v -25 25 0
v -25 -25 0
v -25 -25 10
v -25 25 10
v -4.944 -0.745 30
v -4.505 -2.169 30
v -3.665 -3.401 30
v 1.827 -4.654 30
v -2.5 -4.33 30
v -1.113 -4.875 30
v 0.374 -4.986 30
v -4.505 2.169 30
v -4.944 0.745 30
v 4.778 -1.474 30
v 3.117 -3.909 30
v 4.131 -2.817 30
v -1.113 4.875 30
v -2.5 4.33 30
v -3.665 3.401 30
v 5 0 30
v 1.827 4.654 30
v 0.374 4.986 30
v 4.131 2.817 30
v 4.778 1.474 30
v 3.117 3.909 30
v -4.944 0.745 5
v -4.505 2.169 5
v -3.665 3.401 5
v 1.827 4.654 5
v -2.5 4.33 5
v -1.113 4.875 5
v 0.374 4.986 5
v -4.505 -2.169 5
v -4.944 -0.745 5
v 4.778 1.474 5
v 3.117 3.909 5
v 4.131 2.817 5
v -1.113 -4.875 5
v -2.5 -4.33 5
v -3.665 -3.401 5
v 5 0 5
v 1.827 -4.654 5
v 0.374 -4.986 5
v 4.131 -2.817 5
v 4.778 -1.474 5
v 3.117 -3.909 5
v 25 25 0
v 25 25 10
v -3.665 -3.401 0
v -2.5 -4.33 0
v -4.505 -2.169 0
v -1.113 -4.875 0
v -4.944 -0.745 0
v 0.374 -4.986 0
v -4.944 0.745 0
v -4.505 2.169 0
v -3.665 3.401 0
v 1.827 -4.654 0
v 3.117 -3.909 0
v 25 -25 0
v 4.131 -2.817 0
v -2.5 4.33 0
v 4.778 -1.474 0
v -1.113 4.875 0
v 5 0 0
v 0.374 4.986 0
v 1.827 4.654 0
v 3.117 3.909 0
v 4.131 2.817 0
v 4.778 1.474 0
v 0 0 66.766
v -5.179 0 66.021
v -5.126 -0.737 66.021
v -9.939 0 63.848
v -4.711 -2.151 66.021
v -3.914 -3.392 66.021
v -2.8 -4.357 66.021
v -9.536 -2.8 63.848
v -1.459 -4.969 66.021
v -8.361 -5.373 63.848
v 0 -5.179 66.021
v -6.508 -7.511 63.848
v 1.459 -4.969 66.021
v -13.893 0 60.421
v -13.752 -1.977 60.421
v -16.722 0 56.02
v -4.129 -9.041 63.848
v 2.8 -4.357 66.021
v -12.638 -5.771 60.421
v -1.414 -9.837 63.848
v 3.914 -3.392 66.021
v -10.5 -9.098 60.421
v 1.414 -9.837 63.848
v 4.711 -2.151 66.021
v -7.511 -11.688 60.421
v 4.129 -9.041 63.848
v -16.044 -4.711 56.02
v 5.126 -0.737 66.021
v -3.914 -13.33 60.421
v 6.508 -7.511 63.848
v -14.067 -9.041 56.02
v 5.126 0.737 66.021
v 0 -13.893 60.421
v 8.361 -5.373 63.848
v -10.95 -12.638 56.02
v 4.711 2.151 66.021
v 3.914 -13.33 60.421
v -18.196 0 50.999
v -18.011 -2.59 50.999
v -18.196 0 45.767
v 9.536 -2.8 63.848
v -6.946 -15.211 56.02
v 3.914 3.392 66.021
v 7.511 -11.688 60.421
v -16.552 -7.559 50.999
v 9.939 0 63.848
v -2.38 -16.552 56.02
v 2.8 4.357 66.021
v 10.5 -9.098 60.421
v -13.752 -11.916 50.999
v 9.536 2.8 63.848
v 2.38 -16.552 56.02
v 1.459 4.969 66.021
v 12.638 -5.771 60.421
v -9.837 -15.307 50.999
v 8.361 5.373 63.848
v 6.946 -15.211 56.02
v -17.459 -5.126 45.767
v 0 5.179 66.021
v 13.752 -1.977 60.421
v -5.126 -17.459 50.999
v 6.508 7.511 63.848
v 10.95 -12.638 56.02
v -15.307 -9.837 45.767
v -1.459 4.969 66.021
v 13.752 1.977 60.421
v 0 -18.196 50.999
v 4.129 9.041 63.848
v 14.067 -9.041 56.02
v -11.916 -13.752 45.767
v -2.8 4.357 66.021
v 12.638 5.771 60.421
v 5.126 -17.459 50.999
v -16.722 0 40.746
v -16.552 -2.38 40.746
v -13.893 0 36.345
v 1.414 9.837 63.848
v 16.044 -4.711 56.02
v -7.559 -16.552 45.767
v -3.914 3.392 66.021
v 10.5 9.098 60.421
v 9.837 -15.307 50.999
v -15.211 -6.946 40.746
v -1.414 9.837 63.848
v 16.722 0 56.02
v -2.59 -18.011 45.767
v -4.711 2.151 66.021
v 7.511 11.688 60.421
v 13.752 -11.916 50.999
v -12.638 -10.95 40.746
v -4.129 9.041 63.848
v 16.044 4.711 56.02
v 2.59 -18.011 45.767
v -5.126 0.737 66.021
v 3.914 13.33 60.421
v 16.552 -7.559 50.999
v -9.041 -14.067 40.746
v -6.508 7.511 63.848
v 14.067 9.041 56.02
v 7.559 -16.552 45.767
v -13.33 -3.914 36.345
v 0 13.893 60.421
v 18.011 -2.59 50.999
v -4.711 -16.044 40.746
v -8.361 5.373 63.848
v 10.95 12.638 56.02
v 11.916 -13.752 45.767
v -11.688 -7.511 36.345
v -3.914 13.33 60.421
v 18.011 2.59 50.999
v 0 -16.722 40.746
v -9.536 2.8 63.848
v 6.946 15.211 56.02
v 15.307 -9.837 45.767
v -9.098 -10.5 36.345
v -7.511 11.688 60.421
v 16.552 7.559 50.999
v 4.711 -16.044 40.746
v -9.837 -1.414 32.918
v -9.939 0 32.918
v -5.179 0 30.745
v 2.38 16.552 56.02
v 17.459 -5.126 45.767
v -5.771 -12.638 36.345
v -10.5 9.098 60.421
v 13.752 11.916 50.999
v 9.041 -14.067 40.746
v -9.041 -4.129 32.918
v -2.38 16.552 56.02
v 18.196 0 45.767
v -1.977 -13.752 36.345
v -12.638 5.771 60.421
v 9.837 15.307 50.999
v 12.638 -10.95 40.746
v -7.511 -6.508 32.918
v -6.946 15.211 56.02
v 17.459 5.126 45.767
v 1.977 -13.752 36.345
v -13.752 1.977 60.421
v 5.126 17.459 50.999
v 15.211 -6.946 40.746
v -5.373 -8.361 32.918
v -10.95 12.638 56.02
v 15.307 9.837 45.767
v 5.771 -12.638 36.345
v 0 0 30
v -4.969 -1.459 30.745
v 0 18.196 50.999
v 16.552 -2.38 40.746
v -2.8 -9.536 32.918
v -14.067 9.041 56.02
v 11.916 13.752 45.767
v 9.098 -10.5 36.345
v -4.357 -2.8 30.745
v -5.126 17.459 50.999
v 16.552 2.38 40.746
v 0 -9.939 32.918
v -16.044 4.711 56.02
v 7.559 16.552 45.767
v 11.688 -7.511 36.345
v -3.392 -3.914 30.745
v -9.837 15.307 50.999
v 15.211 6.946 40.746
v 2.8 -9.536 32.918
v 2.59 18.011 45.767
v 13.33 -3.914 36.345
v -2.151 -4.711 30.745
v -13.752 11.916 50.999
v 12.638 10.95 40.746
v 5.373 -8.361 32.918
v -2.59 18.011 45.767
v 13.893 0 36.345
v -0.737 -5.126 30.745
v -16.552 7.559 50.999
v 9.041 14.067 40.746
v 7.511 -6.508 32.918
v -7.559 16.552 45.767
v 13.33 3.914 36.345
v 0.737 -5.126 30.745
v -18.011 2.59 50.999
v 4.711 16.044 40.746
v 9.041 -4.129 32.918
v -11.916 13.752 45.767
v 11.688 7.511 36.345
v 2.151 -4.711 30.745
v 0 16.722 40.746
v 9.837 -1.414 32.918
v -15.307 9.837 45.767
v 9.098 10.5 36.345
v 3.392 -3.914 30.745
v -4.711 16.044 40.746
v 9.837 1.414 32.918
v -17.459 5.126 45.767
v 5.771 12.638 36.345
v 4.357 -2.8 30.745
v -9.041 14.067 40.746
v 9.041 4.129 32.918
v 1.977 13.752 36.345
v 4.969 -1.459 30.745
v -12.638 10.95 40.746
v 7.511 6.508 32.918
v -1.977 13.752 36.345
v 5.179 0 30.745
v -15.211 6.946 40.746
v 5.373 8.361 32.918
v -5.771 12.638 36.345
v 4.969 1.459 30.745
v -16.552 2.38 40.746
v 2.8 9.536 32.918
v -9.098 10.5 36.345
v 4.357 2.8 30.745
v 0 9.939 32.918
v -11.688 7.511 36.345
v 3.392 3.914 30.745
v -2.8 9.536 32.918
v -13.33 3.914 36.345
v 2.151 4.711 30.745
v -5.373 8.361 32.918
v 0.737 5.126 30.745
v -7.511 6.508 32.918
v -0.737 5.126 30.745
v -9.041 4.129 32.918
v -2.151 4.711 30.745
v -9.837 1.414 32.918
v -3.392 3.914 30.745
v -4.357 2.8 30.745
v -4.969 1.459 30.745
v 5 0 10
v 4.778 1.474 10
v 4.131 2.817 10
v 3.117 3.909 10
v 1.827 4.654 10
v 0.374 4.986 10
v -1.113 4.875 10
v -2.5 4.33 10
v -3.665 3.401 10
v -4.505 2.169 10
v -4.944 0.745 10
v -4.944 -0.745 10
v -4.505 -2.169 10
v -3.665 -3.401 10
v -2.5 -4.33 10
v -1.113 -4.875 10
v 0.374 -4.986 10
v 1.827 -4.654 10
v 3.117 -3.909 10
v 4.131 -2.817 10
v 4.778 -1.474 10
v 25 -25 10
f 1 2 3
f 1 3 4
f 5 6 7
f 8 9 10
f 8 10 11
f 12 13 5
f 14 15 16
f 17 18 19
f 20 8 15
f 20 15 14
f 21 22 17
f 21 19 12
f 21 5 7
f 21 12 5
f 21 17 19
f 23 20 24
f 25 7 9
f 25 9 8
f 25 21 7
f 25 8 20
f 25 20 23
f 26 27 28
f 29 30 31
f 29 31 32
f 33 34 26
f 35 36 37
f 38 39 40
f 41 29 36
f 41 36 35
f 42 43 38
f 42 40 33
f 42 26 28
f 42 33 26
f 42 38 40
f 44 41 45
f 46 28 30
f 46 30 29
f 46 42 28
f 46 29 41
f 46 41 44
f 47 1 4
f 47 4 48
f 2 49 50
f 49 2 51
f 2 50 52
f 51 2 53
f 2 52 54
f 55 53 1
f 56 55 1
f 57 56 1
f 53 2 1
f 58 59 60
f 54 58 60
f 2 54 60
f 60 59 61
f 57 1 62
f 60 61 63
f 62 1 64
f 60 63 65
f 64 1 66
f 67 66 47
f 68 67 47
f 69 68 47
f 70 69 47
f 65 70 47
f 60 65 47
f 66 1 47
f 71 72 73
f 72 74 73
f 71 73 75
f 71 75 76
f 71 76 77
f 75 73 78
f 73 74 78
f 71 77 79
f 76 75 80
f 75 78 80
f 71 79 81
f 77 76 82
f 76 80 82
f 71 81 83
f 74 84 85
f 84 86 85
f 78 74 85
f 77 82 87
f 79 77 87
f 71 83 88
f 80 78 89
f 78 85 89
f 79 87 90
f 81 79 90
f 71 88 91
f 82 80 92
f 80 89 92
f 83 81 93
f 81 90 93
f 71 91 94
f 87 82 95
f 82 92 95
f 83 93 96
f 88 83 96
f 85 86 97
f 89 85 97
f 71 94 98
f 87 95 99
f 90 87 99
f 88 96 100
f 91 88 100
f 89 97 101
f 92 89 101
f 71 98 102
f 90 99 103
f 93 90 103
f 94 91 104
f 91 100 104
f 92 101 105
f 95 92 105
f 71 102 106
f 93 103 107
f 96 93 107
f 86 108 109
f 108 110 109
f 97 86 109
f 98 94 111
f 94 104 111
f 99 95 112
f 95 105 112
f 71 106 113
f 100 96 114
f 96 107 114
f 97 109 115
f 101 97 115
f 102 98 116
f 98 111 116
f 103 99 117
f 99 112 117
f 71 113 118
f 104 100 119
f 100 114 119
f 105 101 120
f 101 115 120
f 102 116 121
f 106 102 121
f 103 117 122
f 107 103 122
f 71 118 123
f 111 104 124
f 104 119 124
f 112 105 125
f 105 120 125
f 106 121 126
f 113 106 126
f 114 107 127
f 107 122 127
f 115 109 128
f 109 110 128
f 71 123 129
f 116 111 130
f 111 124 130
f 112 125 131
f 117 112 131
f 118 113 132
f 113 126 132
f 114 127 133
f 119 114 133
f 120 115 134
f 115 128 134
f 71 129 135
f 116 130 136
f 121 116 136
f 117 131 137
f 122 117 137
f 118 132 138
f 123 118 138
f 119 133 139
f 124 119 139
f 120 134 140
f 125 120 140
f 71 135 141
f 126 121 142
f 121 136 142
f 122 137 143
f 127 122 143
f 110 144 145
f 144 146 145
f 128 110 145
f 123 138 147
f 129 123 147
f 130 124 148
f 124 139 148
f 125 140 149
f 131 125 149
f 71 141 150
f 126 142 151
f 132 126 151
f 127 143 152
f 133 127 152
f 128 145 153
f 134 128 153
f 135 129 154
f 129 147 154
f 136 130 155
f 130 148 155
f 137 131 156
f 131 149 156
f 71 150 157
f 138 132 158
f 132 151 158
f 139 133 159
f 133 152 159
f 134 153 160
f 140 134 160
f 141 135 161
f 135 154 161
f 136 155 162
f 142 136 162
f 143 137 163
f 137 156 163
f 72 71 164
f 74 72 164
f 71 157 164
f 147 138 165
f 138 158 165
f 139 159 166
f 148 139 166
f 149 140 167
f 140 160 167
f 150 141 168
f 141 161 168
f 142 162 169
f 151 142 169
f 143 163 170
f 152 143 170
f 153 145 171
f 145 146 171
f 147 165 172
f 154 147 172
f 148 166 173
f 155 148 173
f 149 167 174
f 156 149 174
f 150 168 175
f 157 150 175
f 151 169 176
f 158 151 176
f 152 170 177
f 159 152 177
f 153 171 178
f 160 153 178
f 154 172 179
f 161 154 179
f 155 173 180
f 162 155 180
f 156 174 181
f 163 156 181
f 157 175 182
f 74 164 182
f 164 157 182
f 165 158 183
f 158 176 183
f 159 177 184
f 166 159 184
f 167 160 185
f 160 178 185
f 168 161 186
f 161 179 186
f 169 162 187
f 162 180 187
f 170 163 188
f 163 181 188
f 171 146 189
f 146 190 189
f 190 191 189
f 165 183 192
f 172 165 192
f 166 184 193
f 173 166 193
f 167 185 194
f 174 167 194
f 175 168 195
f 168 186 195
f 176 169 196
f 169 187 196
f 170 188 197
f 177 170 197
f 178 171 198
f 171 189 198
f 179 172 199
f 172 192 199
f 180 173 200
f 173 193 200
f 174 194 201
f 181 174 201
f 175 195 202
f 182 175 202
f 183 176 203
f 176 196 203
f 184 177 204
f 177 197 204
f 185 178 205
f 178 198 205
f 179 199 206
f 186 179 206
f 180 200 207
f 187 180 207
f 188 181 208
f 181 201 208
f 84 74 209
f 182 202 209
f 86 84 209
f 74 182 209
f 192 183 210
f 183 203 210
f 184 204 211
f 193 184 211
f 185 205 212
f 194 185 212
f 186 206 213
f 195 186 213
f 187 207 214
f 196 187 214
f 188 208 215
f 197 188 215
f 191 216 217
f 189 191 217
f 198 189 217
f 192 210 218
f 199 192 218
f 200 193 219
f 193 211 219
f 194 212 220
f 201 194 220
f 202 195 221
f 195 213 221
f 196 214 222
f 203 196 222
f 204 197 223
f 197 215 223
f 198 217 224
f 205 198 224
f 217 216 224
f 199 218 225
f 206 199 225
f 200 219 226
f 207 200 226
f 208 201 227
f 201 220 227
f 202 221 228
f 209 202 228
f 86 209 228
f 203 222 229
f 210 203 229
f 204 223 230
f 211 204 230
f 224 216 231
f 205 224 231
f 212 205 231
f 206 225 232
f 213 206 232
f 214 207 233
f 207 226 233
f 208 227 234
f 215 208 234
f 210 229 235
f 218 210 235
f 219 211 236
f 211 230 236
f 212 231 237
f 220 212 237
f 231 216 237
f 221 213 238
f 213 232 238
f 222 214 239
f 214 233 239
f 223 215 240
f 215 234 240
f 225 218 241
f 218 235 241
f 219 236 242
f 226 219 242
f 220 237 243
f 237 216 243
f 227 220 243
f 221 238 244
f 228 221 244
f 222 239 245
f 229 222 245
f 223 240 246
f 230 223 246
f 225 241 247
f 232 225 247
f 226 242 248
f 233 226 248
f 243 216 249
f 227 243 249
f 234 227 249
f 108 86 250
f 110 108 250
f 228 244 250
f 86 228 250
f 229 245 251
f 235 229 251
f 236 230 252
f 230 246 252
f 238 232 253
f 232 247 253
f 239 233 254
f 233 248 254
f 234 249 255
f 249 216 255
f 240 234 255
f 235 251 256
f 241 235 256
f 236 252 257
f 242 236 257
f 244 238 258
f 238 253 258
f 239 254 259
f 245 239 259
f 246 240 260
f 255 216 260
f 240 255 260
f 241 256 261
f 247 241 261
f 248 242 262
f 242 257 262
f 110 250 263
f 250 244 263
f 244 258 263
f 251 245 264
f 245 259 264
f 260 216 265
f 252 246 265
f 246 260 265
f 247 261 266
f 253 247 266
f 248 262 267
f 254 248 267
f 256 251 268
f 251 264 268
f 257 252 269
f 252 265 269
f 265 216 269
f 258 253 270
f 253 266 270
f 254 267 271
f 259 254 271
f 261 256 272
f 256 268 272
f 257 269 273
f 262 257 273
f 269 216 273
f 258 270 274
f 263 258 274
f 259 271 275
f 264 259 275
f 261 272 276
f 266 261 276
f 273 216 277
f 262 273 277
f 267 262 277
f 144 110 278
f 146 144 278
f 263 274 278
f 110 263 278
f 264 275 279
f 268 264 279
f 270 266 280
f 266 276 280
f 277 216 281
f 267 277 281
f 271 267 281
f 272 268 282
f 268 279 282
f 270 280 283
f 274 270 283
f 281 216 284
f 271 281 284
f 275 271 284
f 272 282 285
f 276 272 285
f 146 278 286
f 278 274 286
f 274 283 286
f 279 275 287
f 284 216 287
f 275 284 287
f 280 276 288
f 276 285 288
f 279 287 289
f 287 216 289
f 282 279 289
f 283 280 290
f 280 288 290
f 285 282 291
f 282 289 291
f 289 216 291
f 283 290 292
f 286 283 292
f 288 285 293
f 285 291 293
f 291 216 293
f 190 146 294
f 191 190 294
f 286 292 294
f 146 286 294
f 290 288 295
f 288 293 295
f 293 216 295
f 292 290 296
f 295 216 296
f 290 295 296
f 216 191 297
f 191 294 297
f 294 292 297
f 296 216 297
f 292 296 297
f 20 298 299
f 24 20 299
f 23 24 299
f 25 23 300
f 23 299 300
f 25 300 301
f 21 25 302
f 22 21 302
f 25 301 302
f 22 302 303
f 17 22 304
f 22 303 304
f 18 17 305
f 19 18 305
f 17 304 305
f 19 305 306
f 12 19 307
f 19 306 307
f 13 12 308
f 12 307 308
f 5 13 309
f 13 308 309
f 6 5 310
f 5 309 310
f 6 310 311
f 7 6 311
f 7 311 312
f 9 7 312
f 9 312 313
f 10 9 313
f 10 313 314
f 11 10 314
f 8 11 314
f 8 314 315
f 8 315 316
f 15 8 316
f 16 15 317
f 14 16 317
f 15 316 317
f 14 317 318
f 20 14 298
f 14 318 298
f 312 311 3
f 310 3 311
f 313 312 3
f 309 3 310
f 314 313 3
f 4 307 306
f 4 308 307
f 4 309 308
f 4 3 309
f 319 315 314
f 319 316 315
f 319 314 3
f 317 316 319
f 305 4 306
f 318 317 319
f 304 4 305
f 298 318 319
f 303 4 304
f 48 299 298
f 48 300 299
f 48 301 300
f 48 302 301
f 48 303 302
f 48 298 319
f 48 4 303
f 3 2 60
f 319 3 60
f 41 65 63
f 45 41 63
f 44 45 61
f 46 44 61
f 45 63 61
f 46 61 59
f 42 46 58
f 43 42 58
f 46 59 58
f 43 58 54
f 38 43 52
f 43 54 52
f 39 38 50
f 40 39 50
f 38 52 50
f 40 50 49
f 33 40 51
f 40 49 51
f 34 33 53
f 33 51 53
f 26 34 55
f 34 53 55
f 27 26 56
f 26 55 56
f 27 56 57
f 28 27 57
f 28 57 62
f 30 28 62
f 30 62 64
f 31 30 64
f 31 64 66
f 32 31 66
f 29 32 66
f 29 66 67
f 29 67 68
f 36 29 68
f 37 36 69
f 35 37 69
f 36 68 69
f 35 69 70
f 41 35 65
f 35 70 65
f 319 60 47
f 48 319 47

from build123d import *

# Parameters (mm, degrees)
SKETCH_1_W          = 50
SKETCH_1_H          = 50
EXTRUDE_1_DEPTH     = 10
SKETCH_2_R          = 5
EXTRUDE_2_DEPTH     = 20
SKETCH_5_R          = 5
CUT_EXTRUDE_3_DEPTH = 5


with BuildPart() as part:
    # 草图1 → 凸台-拉伸1 (new body)
    with BuildSketch(Plane.XY):
        Rectangle(SKETCH_1_W, SKETCH_1_H)
    extrude(amount=EXTRUDE_1_DEPTH)

    # 草图2 → 凸台-拉伸2 (add)
    with BuildSketch(Plane.XY.offset(10)):
        Circle(SKETCH_2_R)
    extrude(amount=EXTRUDE_2_DEPTH)

    # 草图5 → 切除-拉伸3 (cut)
    with BuildSketch(Plane(origin=(0, 0, 0), x_dir=(-1, 0, 0), z_dir=(0, 0, -1))):
        with Locations(Location((0, 0, 0), (0, 0, 180))):
            Circle(SKETCH_5_R)
    extrude(amount=-CUT_EXTRUDE_3_DEPTH, mode=Mode.SUBTRACT)


with BuildPart() as body_2:
    # 草图4 → 旋转16 (revolve)
    with BuildSketch(Plane(origin=(0, 0, 0), x_dir=(1, 0, 0), z_dir=(0, 1, 0))):
        with BuildLine():
            Line((0, -30), (0, -66.766135568))
            ThreePointArc((0, -66.766135568), (-18.383067784, -48.383067784), (0, -30))
        make_face()
    revolve(axis=Axis((0, 0, 30), (0, 0, 1)))


solid = Compound([part.part, body_2.part])
